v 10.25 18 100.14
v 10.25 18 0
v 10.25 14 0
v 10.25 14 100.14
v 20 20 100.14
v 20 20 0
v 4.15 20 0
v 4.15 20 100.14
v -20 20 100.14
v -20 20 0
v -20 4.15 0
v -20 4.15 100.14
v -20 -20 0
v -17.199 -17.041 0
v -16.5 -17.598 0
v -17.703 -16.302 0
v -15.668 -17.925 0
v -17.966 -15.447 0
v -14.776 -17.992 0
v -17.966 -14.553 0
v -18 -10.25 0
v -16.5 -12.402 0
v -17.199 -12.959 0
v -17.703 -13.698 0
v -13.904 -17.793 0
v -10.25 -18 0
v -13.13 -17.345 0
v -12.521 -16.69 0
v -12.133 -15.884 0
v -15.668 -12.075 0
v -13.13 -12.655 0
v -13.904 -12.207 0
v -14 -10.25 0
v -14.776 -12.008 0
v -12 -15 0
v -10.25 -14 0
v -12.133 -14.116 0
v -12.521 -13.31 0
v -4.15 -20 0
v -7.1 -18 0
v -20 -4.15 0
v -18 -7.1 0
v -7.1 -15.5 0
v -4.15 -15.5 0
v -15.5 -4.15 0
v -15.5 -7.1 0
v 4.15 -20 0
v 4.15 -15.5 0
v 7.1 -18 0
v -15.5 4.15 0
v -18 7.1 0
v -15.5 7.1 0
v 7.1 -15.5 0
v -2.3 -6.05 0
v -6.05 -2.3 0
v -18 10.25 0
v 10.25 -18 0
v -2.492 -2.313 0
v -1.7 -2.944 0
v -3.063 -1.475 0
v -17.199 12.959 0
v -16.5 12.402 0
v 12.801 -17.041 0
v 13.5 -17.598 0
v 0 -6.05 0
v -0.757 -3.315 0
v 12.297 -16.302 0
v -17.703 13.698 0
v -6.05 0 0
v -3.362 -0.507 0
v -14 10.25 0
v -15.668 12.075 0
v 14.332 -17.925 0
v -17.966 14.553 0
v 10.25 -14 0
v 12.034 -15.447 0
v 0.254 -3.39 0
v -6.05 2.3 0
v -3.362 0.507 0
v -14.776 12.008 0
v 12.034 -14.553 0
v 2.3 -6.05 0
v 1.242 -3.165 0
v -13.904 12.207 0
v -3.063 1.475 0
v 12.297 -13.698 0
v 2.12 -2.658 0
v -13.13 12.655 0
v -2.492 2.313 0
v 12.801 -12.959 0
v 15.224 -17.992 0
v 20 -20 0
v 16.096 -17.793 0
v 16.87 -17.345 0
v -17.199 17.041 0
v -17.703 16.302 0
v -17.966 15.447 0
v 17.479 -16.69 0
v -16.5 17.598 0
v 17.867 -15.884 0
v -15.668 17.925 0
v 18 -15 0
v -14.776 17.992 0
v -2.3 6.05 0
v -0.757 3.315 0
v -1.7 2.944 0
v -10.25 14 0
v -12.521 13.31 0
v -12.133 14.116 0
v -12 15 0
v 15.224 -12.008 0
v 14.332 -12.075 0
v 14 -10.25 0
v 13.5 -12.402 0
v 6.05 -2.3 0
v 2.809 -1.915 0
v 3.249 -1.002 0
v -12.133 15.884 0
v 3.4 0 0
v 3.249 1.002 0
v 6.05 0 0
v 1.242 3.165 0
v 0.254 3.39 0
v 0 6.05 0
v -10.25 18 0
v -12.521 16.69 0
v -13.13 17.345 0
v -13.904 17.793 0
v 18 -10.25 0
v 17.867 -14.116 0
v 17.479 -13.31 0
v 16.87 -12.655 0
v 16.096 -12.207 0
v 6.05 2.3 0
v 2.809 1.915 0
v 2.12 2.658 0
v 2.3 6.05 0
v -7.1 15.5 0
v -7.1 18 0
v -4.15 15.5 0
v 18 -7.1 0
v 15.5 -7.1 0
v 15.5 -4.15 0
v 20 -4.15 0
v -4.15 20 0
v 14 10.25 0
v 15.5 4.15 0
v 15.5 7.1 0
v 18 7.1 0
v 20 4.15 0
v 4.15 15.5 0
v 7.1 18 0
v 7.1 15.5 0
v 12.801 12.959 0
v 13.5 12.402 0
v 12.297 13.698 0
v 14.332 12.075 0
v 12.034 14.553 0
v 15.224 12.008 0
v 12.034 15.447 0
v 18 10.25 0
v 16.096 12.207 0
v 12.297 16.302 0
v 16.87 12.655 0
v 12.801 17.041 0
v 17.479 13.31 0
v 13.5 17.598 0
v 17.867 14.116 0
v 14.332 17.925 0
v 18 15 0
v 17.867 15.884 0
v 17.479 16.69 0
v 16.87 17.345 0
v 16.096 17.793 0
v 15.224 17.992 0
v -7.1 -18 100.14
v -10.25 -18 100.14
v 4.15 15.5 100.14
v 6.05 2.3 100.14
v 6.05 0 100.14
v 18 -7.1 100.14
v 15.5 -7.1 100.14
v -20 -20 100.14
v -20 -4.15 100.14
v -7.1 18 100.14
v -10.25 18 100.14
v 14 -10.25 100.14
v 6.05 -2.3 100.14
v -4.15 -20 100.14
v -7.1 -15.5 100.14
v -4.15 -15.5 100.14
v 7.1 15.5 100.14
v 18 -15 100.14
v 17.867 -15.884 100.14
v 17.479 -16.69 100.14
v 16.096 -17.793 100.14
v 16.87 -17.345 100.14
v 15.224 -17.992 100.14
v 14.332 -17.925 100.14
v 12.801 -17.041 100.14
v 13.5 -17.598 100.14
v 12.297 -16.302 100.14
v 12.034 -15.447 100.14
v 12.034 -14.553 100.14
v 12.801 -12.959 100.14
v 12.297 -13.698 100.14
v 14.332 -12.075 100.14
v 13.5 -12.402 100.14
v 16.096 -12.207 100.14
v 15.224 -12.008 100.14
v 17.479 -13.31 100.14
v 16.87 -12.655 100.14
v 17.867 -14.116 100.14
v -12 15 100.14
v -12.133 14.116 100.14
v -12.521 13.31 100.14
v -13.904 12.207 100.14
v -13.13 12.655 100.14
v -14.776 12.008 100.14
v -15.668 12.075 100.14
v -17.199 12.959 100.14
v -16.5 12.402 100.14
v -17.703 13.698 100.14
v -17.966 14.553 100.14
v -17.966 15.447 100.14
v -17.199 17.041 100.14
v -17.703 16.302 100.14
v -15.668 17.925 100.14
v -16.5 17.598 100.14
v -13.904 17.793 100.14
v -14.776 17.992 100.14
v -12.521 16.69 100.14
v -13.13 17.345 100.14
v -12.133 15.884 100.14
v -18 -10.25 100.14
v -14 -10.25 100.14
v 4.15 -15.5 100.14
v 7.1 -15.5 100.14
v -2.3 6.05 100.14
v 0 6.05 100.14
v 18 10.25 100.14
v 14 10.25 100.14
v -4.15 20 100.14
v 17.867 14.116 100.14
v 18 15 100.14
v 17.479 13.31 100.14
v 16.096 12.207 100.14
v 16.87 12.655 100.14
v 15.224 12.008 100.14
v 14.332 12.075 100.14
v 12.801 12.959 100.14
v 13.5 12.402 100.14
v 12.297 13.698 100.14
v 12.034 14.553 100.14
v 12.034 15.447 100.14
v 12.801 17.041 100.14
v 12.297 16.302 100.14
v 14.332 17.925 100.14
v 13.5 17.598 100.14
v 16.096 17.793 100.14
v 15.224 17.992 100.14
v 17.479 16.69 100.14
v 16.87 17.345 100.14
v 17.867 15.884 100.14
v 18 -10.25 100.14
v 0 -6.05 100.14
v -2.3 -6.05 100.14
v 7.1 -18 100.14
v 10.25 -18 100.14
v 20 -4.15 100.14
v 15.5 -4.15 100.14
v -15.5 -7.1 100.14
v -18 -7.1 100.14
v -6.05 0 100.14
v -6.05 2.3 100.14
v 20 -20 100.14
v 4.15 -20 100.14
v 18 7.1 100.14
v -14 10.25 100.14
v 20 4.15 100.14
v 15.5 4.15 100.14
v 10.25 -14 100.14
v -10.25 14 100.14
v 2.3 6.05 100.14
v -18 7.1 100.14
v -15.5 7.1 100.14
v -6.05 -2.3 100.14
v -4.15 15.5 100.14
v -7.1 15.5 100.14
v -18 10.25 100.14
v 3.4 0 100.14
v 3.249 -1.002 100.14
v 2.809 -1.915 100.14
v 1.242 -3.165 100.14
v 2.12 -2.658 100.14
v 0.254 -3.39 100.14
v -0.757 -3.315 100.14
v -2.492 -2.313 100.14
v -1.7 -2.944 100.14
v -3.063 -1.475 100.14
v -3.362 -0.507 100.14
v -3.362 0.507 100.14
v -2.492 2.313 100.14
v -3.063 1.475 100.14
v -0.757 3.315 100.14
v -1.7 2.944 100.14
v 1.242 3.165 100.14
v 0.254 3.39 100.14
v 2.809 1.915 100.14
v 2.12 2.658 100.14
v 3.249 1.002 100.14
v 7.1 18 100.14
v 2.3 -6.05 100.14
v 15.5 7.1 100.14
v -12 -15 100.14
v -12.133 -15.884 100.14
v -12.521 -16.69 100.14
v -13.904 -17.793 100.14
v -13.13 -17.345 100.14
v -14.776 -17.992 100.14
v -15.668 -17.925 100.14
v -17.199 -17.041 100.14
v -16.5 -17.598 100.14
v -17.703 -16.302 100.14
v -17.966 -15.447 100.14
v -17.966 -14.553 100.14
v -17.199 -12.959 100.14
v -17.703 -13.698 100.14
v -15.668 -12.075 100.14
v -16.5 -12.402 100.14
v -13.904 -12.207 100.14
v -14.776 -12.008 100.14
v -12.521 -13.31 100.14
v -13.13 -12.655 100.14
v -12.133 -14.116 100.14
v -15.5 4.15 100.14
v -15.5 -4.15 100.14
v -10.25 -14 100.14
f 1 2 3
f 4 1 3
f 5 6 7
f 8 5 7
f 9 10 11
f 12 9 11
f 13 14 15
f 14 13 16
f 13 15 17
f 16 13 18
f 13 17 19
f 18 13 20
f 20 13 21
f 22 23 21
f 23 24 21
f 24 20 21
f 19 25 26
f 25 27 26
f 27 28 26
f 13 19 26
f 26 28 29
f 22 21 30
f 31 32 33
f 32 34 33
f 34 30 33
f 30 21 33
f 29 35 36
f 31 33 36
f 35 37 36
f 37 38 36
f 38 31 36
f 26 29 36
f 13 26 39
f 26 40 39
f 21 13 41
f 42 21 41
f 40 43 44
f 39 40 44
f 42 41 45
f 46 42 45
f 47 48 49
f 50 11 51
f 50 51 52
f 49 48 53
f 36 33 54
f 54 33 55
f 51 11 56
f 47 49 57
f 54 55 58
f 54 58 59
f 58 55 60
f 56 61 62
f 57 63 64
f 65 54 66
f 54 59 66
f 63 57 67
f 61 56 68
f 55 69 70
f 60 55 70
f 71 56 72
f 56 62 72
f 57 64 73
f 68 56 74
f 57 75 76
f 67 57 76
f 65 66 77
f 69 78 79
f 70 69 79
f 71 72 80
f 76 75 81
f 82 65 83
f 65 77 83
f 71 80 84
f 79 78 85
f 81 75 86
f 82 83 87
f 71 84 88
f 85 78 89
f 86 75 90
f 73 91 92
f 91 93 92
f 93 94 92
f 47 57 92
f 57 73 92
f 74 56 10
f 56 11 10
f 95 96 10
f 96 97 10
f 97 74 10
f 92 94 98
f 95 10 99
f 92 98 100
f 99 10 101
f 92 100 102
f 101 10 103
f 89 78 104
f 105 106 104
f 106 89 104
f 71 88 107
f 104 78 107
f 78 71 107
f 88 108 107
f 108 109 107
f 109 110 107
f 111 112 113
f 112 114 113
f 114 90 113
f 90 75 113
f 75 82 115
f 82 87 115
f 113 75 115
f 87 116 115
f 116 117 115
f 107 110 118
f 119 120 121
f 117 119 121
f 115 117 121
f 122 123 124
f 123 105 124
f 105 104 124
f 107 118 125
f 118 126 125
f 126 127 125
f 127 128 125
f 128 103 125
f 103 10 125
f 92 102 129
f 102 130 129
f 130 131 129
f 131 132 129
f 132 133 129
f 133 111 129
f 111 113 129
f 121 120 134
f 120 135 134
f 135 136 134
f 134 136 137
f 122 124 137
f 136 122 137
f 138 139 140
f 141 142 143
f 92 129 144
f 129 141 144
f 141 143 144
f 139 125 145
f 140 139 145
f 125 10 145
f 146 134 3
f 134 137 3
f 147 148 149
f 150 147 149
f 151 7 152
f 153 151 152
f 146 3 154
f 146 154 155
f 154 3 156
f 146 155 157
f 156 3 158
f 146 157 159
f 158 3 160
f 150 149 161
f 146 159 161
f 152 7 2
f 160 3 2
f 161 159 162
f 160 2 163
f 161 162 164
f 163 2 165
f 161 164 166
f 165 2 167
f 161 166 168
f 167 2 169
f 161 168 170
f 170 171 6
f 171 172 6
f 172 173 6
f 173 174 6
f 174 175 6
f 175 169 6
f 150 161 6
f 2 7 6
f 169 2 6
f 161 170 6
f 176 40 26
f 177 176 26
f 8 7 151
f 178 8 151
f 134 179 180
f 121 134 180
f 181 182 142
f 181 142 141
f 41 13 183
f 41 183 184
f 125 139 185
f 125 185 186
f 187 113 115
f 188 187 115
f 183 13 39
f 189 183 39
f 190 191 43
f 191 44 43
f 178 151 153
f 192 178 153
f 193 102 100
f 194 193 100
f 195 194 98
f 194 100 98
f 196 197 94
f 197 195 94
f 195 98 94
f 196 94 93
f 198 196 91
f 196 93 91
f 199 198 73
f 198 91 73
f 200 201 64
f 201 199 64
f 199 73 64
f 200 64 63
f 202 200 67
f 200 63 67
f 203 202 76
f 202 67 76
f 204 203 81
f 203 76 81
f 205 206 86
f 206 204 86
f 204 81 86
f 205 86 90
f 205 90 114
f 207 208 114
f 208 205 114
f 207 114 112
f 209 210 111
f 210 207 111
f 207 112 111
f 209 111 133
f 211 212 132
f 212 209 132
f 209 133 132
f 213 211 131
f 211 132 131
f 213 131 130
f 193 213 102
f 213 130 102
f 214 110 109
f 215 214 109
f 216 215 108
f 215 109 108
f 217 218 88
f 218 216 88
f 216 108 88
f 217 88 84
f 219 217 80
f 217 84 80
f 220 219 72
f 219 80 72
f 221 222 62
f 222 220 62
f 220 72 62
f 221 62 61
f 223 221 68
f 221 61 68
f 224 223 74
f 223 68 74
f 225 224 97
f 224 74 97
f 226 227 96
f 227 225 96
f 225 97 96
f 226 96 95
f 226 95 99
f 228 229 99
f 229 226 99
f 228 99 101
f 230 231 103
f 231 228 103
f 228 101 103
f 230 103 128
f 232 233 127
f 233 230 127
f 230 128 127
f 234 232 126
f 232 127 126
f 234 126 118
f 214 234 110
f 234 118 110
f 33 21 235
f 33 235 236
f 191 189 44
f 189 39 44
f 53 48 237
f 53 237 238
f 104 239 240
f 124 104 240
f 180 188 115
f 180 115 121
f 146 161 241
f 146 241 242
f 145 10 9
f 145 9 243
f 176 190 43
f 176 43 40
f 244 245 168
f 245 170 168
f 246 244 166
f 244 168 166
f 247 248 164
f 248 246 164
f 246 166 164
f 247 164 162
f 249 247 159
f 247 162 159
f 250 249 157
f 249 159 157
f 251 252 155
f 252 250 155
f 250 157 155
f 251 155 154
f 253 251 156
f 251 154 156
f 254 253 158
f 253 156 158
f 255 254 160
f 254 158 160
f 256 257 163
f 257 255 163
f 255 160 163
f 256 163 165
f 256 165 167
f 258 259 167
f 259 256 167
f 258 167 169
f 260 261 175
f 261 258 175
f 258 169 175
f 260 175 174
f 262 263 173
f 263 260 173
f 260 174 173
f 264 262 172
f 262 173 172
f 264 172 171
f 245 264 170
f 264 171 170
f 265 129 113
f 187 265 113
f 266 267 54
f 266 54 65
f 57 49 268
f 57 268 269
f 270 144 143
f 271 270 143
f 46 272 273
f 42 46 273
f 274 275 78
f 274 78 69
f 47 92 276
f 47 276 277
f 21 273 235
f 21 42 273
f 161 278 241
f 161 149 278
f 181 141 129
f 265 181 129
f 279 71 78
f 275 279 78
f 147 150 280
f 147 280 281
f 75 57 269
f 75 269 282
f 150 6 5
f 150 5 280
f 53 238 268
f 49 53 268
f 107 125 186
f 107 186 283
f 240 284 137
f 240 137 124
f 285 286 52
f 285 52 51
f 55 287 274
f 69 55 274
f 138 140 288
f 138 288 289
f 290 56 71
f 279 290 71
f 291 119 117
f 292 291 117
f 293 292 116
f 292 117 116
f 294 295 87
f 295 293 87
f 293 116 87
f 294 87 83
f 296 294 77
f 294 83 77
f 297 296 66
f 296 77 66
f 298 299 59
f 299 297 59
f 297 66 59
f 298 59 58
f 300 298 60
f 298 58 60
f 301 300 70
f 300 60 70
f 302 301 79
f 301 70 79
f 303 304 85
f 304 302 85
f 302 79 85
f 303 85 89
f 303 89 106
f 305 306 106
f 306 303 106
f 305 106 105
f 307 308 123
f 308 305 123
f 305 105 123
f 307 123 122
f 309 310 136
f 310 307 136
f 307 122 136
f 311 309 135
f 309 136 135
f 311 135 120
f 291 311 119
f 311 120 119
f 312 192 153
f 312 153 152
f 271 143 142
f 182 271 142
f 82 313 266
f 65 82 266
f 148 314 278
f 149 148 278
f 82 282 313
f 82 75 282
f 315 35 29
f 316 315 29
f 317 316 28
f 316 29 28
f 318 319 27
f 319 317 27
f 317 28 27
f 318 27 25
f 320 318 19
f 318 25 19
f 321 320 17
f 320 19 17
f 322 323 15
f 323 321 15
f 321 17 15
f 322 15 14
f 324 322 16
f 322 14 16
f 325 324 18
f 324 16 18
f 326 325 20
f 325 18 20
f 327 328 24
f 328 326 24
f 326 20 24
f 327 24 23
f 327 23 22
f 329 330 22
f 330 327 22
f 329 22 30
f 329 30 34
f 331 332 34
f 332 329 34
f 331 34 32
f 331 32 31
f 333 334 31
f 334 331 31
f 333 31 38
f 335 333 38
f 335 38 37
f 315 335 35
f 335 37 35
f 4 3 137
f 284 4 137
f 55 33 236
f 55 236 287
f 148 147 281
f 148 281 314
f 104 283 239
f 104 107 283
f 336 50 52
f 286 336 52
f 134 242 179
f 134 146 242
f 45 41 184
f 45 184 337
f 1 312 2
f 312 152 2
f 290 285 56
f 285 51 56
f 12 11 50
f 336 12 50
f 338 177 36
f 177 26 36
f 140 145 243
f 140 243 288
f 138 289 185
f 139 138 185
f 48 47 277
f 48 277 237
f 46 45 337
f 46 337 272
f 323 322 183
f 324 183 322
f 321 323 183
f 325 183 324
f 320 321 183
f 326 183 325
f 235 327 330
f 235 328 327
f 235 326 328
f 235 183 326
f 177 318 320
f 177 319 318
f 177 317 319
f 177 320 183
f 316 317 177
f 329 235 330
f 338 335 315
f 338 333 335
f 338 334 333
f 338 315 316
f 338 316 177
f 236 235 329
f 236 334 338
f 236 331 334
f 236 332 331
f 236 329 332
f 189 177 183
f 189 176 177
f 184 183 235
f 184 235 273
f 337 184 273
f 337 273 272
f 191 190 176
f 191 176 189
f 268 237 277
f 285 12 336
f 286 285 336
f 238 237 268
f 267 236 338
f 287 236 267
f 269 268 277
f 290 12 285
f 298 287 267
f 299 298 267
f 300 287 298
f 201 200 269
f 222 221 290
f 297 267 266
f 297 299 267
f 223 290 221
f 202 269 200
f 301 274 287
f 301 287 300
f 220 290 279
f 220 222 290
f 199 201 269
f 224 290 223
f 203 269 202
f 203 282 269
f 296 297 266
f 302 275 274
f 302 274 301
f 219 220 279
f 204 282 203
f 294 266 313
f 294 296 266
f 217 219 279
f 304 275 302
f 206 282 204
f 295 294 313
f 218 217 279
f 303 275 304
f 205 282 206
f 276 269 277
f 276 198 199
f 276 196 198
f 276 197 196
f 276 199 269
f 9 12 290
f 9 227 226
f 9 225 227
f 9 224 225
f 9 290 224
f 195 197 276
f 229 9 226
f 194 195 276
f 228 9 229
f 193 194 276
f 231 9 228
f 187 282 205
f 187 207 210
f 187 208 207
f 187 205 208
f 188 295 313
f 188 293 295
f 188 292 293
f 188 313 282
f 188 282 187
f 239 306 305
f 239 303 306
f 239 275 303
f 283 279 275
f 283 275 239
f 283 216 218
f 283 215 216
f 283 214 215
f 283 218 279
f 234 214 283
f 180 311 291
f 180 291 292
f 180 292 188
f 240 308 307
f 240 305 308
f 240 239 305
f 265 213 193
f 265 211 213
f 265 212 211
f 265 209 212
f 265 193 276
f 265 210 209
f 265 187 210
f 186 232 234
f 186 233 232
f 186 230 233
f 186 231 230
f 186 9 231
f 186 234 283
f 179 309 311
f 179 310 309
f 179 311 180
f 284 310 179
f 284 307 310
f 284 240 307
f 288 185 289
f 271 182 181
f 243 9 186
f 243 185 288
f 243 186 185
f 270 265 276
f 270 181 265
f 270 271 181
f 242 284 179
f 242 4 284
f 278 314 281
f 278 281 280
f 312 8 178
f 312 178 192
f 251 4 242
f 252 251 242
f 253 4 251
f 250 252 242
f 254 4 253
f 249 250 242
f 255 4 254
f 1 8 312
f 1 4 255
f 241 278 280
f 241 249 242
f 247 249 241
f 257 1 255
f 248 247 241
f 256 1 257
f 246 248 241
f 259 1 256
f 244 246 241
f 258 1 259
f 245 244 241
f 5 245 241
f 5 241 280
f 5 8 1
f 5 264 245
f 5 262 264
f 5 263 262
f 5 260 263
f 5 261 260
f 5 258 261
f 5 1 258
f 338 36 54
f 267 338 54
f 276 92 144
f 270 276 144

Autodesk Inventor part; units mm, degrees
ref_plane "YZ Plane" through (0, 0, 0) normal (1, 0, 0) x (0, 1, 0)
ref_plane "XZ Plane" through (0, 0, 0) normal (0, 1, 0) x (-1, 0, 0)
sketch "Sketch1" plane through (0, 0, 0) normal (0, 0, 1) x (1, 0, 0)
  circle A0 centre (0, 0) radius 3.4
  line L0 (0, 0) -> (20, 20) construction
  line L1 (0, 0) -> (28.2843, 0) construction
  line L2 (20, 20) -> (4.15, 20)
  line L3 (4.15, 20) -> (4.15, 15.5)
  line L4 (4.15, 15.5) -> (7.1, 15.5)
  line L5 (7.1, 15.5) -> (7.1, 18)
  line L6 (7.1, 18) -> (10.25, 18)
  line L7 (10.25, 18) -> (10.25, 14)
  line L8 (0, 0) -> (0, 26.1056) construction
  line L9 (10.25, 14) -> (2.3, 6.05)
  line L10 (2.3, 6.05) -> (0, 6.05)
  circle A1 centre (15, 15) radius 3
  line L11 (20, 20) -> (20, 4.15)
  line L12 (20, 4.15) -> (15.5, 4.15)
  line L13 (15.5, 4.15) -> (15.5, 7.1)
  line L14 (15.5, 7.1) -> (18, 7.1)
  line L15 (18, 7.1) -> (18, 10.25)
  line L16 (18, 10.25) -> (14, 10.25)
  line L17 (14, 10.25) -> (6.05, 2.3)
  line L18 (6.05, 2.3) -> (6.05, 0)
  line L19 (-2.3, 6.05) -> (0, 6.05)
  line L20 (-10.25, 14) -> (-2.3, 6.05)
  line L21 (-10.25, 18) -> (-10.25, 14)
  line L22 (-4.15, 15.5) -> (-7.1, 15.5)
  line L23 (-7.1, 15.5) -> (-7.1, 18)
  line L24 (-7.1, 18) -> (-10.25, 18)
  line L25 (-4.15, 20) -> (-4.15, 15.5)
  line L26 (-20, 20) -> (-4.15, 20)
  circle A2 centre (-15, 15) radius 3
  line L27 (-20, 20) -> (-20, 4.15)
  line L28 (-14, 10.25) -> (-6.05, 2.3)
  line L29 (-18, 7.1) -> (-18, 10.25)
  line L30 (-18, 10.25) -> (-14, 10.25)
  line L31 (-20, 4.15) -> (-15.5, 4.15)
  line L32 (-15.5, 4.15) -> (-15.5, 7.1)
  line L33 (-15.5, 7.1) -> (-18, 7.1)
  line L34 (-6.05, 2.3) -> (-6.05, 0)
  line L35 (-6.05, -2.3) -> (-6.05, 0)
  line L36 (-14, -10.25) -> (-6.05, -2.3)
  line L37 (-18, -10.25) -> (-14, -10.25)
  line L38 (-15.5, -4.15) -> (-15.5, -7.1)
  line L39 (-15.5, -7.1) -> (-18, -7.1)
  line L40 (-18, -7.1) -> (-18, -10.25)
  line L41 (-20, -4.15) -> (-15.5, -4.15)
  line L42 (-20, -20) -> (-20, -4.15)
  circle A3 centre (-15, -15) radius 3
  line L43 (-20, -20) -> (-4.15, -20)
  line L44 (-10.25, -14) -> (-2.3, -6.05)
  line L45 (-7.1, -18) -> (-10.25, -18)
  line L46 (-10.25, -18) -> (-10.25, -14)
  line L47 (-4.15, -20) -> (-4.15, -15.5)
  line L48 (-4.15, -15.5) -> (-7.1, -15.5)
  line L49 (-7.1, -15.5) -> (-7.1, -18)
  line L50 (-2.3, -6.05) -> (0, -6.05)
  line L51 (2.3, -6.05) -> (0, -6.05)
  line L52 (10.25, -14) -> (2.3, -6.05)
  line L53 (10.25, -18) -> (10.25, -14)
  line L54 (4.15, -15.5) -> (7.1, -15.5)
  line L55 (7.1, -15.5) -> (7.1, -18)
  line L56 (7.1, -18) -> (10.25, -18)
  line L57 (4.15, -20) -> (4.15, -15.5)
  line L58 (20, -20) -> (4.15, -20)
  circle A4 centre (15, -15) radius 3
  line L59 (20, -20) -> (20, -4.15)
  line L60 (14, -10.25) -> (6.05, -2.3)
  line L61 (18, -7.1) -> (18, -10.25)
  line L62 (18, -10.25) -> (14, -10.25)
  line L63 (20, -4.15) -> (15.5, -4.15)
  line L64 (15.5, -4.15) -> (15.5, -7.1)
  line L65 (15.5, -7.1) -> (18, -7.1)
  line L66 (6.05, -2.3) -> (6.05, 0)
  point P0 (0, 6.05)
  point P1 (-6.05, 0)
  point P2 (0, -6.05)
  dimension "d0" = 6.8
  dimension "d1" = 45
  dimension "d2" = 20
  dimension "d3" = 6
  dimension "d4" = 15
  dimension "d5" = 10.25
  dimension "d6" = 7.1
  dimension "d7" = 4.15
  dimension "d8" = 4.5
  dimension "d9" = 2
  dimension "d10" = 13.95
  dimension "d11" = 6
  dimension "d14" = 360
extrude "Extrusion1" add sketch "Sketch1" along normal blind 100.14
ref_plane "Work Plane1" through (0, 0, 50.07) normal (0, 0, 1) x (1, 0, 0)
properties part number "Aluminum_Profile_4040_100.14mm_bottom" material "Aluminum 6061-AHC"
